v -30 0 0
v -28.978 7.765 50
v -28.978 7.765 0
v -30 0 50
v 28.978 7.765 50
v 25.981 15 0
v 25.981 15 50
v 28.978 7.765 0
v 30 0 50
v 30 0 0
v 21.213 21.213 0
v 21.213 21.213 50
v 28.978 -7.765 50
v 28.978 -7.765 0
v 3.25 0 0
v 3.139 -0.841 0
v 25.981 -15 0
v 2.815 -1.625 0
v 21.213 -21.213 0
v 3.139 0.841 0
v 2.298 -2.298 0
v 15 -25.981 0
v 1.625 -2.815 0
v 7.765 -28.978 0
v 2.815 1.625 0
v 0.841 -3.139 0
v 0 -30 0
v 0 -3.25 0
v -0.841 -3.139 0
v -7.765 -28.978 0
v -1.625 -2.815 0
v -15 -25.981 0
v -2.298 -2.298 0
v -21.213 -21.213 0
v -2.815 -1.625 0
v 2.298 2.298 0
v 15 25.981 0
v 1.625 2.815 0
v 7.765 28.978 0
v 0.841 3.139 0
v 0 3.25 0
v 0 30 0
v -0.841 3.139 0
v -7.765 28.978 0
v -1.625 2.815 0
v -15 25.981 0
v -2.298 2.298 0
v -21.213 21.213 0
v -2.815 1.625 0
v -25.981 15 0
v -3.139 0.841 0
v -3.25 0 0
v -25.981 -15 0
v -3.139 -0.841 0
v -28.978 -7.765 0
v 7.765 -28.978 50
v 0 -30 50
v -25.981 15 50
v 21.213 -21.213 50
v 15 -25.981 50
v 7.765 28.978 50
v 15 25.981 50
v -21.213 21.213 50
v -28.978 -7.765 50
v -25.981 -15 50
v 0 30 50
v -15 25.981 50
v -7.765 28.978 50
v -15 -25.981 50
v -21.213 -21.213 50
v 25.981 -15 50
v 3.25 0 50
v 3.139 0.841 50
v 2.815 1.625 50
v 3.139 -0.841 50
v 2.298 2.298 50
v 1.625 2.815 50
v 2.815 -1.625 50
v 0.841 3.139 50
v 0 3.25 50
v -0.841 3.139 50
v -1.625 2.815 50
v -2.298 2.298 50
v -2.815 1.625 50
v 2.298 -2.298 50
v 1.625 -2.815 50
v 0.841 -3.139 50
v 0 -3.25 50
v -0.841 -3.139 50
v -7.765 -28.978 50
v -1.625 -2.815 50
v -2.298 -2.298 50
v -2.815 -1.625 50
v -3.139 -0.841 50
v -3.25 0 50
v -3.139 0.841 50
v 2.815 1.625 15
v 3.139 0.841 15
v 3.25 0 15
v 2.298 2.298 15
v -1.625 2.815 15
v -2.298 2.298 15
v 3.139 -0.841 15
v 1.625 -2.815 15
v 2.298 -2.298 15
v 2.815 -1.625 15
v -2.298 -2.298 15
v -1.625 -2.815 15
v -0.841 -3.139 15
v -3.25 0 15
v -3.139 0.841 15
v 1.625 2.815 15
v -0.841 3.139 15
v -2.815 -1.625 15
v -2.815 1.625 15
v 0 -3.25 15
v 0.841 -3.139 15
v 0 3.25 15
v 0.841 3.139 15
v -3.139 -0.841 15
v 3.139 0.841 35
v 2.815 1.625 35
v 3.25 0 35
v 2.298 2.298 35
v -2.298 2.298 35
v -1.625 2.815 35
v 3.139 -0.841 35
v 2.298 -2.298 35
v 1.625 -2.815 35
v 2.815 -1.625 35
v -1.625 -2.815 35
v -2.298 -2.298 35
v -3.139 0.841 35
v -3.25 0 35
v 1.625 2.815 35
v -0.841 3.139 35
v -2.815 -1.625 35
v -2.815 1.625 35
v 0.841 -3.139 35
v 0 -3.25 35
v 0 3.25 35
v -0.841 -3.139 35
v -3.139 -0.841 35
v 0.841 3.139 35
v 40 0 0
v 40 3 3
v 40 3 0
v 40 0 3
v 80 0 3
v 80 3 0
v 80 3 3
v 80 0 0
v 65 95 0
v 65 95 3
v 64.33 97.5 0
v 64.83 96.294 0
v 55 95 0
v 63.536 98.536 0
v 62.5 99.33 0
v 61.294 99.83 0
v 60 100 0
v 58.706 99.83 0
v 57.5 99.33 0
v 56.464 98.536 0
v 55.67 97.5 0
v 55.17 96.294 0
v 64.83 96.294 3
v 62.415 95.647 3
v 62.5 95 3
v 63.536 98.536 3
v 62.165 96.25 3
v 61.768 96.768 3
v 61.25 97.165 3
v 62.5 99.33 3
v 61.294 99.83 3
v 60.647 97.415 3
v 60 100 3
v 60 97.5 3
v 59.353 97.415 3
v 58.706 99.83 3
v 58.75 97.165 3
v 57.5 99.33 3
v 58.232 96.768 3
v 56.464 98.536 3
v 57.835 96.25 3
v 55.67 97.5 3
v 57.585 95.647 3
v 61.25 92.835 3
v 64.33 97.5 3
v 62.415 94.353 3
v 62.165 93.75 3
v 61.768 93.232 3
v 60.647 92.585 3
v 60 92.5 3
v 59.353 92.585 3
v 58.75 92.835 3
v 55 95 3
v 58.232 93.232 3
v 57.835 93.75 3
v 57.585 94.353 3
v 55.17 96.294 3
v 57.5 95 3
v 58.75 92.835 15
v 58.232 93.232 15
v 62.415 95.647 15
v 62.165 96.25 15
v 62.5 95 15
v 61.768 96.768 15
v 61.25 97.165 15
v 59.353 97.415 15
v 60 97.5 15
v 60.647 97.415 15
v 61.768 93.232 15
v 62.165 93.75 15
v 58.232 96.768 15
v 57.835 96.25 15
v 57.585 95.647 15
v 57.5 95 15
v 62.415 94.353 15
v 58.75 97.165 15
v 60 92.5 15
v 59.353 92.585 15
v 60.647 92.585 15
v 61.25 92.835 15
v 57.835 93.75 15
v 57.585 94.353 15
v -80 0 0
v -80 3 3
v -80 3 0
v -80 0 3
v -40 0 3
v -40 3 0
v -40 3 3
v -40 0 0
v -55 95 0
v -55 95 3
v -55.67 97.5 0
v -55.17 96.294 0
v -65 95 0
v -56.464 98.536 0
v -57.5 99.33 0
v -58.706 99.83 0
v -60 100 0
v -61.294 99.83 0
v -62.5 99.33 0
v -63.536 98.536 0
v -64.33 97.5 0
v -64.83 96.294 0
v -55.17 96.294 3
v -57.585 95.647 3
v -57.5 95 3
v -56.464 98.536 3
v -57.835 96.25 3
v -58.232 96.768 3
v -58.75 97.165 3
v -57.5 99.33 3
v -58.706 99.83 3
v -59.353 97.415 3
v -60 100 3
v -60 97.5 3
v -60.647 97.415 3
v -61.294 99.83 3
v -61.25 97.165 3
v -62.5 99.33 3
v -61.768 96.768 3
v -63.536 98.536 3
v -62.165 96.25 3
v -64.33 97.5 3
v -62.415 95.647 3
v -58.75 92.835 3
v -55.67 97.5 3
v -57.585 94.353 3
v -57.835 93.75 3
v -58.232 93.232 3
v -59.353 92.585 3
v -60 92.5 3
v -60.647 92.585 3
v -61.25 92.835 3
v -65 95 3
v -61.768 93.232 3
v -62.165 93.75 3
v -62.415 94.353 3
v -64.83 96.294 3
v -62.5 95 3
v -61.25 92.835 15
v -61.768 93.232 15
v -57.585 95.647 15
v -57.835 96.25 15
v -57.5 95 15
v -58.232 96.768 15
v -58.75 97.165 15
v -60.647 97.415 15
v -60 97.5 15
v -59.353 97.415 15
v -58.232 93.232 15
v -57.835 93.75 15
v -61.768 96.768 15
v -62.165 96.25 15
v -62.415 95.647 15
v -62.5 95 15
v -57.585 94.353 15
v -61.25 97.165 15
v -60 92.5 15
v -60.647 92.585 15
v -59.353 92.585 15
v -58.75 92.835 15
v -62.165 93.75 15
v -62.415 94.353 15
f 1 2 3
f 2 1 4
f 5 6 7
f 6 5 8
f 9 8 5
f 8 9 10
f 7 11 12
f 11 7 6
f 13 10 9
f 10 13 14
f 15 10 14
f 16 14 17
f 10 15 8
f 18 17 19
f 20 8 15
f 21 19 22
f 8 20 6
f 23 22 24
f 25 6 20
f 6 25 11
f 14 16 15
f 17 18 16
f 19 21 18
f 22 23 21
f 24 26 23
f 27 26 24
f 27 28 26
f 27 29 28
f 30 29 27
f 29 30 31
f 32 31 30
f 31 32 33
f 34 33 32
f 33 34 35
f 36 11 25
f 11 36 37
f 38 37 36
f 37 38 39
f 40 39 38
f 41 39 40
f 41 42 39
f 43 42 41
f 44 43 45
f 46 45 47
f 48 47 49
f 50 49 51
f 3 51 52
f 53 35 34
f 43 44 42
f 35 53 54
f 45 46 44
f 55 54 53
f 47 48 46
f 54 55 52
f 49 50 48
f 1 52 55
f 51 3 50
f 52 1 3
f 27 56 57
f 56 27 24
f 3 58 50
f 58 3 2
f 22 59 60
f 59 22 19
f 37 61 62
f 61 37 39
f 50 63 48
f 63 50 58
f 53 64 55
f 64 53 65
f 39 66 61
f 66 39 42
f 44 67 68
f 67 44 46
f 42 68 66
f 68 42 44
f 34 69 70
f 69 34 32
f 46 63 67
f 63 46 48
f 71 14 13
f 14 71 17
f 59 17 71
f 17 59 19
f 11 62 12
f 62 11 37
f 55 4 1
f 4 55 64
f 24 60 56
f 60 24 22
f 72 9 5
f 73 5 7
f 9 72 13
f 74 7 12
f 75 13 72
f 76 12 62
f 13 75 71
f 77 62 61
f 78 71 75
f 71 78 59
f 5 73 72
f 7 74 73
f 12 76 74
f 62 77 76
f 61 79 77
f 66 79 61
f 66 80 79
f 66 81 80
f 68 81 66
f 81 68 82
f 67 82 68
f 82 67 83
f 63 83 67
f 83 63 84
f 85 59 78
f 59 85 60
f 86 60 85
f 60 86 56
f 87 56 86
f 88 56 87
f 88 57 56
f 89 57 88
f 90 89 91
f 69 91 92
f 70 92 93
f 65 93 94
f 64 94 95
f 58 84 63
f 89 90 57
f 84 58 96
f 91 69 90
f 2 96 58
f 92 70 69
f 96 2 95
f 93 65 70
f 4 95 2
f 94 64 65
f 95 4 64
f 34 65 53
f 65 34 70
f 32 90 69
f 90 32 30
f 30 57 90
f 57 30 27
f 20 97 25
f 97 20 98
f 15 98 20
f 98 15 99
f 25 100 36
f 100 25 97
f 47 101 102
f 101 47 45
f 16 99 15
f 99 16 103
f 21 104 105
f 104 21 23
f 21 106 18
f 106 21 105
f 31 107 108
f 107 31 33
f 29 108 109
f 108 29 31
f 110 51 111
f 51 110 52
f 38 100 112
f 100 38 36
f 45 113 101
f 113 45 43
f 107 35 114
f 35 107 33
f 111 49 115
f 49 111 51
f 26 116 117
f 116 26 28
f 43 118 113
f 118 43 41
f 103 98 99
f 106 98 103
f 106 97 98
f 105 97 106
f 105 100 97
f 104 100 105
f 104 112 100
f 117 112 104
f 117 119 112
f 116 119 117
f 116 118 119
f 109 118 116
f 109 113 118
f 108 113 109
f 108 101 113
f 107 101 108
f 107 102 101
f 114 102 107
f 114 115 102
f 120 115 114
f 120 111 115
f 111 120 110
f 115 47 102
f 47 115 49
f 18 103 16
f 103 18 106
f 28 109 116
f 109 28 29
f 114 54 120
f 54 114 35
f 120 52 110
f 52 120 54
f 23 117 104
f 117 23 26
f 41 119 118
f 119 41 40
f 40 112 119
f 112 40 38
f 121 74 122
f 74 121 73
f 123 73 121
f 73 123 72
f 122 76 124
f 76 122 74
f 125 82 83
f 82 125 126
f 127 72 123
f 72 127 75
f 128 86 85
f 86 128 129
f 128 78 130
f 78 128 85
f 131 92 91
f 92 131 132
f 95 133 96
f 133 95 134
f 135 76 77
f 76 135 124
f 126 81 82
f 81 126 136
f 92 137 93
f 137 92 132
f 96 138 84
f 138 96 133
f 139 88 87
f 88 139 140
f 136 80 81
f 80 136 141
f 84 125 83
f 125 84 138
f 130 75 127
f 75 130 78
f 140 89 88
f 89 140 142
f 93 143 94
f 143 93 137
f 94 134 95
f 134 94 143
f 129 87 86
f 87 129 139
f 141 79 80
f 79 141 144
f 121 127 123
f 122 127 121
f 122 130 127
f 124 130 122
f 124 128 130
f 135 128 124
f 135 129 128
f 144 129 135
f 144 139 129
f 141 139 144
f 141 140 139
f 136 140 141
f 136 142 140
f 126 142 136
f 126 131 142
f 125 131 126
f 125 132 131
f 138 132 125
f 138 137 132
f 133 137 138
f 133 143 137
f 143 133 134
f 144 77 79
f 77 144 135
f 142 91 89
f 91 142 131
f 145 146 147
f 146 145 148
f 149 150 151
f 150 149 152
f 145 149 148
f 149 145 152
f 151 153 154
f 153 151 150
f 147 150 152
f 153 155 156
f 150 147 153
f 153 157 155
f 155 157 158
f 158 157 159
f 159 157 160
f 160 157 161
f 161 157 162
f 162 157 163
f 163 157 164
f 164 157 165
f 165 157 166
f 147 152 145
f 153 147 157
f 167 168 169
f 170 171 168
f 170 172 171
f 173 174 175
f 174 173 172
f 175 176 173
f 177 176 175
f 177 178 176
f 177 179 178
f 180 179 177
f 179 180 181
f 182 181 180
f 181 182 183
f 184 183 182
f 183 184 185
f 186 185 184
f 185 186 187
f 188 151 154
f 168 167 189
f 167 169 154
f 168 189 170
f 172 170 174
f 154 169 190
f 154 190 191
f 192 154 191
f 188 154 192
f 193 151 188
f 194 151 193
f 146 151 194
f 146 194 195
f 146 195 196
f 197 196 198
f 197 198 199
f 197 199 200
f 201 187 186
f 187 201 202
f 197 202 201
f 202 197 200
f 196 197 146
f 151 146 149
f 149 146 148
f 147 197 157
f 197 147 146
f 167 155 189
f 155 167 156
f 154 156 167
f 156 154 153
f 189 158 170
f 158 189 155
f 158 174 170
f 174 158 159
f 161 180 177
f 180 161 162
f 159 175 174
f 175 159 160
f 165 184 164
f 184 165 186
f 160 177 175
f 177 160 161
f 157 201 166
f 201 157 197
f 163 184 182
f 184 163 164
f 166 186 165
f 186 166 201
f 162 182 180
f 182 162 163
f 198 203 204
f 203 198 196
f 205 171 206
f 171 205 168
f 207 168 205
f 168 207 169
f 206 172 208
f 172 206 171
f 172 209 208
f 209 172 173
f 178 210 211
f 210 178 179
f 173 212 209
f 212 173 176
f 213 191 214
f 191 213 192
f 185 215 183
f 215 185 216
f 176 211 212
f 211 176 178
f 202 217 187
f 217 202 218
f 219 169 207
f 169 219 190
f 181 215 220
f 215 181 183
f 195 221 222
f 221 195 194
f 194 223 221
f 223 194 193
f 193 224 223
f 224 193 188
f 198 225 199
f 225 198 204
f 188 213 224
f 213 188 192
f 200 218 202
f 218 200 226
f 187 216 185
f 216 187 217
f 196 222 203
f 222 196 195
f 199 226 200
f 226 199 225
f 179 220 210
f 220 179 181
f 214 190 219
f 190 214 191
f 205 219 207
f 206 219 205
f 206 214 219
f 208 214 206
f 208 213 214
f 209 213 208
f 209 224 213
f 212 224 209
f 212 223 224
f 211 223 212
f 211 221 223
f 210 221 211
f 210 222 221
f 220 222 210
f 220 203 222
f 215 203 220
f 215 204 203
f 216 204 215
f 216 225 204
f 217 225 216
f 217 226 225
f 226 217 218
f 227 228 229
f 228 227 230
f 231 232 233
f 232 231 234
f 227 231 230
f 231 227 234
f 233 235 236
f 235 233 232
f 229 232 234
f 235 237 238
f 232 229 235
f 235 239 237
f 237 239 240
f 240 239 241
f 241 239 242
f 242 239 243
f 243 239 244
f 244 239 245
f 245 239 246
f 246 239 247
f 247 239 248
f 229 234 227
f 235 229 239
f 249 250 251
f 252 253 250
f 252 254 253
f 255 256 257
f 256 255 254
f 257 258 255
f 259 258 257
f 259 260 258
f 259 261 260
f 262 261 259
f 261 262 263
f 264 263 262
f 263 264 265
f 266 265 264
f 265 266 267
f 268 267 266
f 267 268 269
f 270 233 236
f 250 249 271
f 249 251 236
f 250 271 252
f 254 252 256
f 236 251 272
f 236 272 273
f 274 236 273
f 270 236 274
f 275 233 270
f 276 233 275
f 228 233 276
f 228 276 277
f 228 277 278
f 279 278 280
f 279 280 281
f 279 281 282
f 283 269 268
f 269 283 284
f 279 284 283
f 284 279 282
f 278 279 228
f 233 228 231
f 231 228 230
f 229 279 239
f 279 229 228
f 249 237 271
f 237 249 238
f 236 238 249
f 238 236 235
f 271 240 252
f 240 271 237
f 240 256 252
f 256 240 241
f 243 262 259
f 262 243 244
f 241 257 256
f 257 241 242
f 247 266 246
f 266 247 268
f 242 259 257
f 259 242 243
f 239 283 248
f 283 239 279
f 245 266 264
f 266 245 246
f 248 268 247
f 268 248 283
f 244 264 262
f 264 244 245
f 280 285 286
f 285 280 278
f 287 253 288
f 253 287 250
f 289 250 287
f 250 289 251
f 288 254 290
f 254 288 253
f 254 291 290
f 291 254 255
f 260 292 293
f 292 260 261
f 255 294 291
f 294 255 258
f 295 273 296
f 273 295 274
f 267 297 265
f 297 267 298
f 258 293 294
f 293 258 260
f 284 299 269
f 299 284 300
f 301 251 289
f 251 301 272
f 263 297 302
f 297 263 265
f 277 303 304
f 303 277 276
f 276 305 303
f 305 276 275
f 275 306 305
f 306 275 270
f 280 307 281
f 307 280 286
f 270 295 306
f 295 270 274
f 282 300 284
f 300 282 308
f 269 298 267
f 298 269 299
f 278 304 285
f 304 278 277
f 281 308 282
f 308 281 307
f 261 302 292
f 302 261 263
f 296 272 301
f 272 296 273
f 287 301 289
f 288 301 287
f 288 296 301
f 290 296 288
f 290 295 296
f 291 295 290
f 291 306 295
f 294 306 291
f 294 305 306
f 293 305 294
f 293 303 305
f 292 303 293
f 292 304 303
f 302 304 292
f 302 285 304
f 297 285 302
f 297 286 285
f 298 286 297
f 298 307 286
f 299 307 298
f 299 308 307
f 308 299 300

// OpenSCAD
// radius cylinder
ray_cyl = 30;
// height cylinder
haut_cyl = 50;

module toto() {
}


$fn = 24;
tol_trou = 1.5;
ray_trou = 2.5;
haut_trou = 15;
ep_pied = 3;
haut_pied = ray_cyl*3;


support();

pied_gauche();

pied_droit();

module support() {

	difference() {
		cylinder(r=ray_cyl,h=haut_cyl);
		cylinder(r=ray_trou+tol_trou/2,h=haut_trou);
		translate([0,0,haut_cyl-haut_trou])
		cylinder(r=ray_trou+tol_trou/2,h=haut_trou);
	}
}

module pied_gauche() {
	
	translate([ray_cyl+10,0,0]) {
		union() {
			hull() {
				cube([ray_cyl/3*4,ep_pied,3]);
				translate([ray_cyl/3*4/2,0,0])
				translate([0,haut_pied,3/2])
				cube([ray_trou*4,ray_trou*4,ep_pied], center = true);
			}
			translate([ray_cyl/3*4/2,0,0])
			translate([0,haut_pied+ray_trou*4/2,3/2])	
			cylinder(r=ray_trou*4/2,h=ep_pied,center=true);
			translate([ray_cyl/3*4/2,0,ep_pied])
			translate([0,haut_pied+ray_trou*4/2,ep_pied+3/2])
			cylinder(r=ray_trou,h=haut_trou,center=true);
		}
	}
}

module pied_droit() {
	
	translate([-(ray_cyl/3*4+ray_cyl+10),0,0]) {
		union() {
			hull() {
				cube([ray_cyl/3*4,ep_pied,3]);
				translate([ray_cyl/3*4/2,0,0])
				translate([0,haut_pied,3/2])
				cube([ray_trou*4,ray_trou*4,ep_pied], center = true);
			}
			translate([ray_cyl/3*4/2,0,0])
			translate([0,haut_pied+ray_trou*4/2,3/2])	
			cylinder(r=ray_trou*4/2,h=ep_pied,center=true);
			translate([ray_cyl/3*4/2,0,ep_pied])
			translate([0,haut_pied+ray_trou*4/2,ep_pied+3/2])
			cylinder(r=ray_trou,h=haut_trou,center=true);
		}
	}
}
